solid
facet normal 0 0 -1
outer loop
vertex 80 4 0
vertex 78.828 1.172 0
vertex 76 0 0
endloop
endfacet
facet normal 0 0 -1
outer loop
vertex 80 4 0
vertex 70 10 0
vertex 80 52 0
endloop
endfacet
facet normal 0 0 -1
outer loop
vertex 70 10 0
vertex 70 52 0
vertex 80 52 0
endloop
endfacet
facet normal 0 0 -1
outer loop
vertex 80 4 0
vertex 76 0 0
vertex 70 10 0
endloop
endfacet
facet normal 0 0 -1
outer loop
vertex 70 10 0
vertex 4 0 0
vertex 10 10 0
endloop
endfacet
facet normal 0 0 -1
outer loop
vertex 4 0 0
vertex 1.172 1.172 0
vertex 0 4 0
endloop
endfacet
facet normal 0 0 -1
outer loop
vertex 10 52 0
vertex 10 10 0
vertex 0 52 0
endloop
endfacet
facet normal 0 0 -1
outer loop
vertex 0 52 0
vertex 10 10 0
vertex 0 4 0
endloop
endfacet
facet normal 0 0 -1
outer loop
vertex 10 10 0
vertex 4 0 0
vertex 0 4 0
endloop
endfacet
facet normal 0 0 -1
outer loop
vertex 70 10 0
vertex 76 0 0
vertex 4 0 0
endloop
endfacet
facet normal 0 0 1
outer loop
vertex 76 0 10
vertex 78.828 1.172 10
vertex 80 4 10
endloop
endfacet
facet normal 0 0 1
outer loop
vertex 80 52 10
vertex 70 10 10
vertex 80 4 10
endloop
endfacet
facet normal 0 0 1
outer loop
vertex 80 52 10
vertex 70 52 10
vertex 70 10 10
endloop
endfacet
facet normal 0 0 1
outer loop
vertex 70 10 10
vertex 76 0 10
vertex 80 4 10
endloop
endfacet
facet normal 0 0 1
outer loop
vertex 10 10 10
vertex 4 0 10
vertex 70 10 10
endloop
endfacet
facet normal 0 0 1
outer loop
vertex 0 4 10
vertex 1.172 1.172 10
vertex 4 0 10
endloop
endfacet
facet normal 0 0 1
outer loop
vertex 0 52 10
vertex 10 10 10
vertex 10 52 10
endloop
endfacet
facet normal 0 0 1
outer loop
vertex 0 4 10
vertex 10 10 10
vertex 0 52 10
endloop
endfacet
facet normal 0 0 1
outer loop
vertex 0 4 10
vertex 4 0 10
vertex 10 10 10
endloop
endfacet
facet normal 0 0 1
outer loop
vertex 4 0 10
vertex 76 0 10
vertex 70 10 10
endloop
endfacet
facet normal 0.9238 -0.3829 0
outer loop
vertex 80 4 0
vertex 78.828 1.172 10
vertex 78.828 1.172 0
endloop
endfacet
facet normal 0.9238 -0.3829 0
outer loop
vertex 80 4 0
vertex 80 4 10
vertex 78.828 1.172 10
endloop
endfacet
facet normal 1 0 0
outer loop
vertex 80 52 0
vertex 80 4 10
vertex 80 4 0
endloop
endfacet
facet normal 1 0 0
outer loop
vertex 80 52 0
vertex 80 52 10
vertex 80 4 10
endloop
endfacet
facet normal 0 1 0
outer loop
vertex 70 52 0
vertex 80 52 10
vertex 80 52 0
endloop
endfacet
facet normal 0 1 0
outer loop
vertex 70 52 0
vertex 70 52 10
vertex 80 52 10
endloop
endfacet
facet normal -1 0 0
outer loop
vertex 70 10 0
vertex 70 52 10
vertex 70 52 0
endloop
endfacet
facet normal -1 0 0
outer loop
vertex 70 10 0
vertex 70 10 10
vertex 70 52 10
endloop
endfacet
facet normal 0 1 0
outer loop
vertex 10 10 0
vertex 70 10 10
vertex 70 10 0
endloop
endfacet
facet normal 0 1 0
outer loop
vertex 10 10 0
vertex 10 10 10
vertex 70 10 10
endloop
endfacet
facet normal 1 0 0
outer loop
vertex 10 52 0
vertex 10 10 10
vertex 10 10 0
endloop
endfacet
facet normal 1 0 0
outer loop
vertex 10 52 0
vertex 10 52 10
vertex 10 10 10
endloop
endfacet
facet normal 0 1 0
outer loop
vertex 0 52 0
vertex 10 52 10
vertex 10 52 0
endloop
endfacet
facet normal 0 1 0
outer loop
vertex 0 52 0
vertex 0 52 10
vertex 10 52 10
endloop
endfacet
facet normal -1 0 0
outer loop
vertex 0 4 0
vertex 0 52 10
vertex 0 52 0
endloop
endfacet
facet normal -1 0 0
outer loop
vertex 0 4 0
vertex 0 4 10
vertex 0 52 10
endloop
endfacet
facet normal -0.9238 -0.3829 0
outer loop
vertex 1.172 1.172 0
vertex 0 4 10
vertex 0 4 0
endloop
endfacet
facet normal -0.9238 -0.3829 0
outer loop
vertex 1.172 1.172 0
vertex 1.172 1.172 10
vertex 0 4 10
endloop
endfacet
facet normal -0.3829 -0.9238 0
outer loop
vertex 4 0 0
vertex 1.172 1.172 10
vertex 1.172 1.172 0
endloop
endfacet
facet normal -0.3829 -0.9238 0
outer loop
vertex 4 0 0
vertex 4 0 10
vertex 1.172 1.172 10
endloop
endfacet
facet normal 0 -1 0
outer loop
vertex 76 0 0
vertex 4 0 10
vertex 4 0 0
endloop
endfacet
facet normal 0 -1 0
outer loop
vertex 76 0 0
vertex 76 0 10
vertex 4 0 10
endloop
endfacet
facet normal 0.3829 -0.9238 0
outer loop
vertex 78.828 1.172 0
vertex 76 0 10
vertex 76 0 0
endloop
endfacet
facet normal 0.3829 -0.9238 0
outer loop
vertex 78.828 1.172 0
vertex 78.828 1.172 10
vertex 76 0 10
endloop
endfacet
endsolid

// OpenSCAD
$fn = 32;

// ----------------------------------------------------------------------
// Heat sink frame: 80 x 52 mm frame, 10 mm walls
// ----------------------------------------------------------------------

// --- parameters (mm) ---
profile_height = 10;      // extrusion height
profile_points = 12;      // points of the closed outline

profile = [[0, 4], [1.172, 1.172], [4, 0], [76, 0], [78.828, 1.172], [80, 4], [80, 52], [70, 52], [70, 10], [10, 10], [10, 52], [0, 52]];  // single closed polygon, 12 points, counter clockwise

// --- the one profile operation ---
linear_extrude(height = profile_height) polygon(points = profile);
